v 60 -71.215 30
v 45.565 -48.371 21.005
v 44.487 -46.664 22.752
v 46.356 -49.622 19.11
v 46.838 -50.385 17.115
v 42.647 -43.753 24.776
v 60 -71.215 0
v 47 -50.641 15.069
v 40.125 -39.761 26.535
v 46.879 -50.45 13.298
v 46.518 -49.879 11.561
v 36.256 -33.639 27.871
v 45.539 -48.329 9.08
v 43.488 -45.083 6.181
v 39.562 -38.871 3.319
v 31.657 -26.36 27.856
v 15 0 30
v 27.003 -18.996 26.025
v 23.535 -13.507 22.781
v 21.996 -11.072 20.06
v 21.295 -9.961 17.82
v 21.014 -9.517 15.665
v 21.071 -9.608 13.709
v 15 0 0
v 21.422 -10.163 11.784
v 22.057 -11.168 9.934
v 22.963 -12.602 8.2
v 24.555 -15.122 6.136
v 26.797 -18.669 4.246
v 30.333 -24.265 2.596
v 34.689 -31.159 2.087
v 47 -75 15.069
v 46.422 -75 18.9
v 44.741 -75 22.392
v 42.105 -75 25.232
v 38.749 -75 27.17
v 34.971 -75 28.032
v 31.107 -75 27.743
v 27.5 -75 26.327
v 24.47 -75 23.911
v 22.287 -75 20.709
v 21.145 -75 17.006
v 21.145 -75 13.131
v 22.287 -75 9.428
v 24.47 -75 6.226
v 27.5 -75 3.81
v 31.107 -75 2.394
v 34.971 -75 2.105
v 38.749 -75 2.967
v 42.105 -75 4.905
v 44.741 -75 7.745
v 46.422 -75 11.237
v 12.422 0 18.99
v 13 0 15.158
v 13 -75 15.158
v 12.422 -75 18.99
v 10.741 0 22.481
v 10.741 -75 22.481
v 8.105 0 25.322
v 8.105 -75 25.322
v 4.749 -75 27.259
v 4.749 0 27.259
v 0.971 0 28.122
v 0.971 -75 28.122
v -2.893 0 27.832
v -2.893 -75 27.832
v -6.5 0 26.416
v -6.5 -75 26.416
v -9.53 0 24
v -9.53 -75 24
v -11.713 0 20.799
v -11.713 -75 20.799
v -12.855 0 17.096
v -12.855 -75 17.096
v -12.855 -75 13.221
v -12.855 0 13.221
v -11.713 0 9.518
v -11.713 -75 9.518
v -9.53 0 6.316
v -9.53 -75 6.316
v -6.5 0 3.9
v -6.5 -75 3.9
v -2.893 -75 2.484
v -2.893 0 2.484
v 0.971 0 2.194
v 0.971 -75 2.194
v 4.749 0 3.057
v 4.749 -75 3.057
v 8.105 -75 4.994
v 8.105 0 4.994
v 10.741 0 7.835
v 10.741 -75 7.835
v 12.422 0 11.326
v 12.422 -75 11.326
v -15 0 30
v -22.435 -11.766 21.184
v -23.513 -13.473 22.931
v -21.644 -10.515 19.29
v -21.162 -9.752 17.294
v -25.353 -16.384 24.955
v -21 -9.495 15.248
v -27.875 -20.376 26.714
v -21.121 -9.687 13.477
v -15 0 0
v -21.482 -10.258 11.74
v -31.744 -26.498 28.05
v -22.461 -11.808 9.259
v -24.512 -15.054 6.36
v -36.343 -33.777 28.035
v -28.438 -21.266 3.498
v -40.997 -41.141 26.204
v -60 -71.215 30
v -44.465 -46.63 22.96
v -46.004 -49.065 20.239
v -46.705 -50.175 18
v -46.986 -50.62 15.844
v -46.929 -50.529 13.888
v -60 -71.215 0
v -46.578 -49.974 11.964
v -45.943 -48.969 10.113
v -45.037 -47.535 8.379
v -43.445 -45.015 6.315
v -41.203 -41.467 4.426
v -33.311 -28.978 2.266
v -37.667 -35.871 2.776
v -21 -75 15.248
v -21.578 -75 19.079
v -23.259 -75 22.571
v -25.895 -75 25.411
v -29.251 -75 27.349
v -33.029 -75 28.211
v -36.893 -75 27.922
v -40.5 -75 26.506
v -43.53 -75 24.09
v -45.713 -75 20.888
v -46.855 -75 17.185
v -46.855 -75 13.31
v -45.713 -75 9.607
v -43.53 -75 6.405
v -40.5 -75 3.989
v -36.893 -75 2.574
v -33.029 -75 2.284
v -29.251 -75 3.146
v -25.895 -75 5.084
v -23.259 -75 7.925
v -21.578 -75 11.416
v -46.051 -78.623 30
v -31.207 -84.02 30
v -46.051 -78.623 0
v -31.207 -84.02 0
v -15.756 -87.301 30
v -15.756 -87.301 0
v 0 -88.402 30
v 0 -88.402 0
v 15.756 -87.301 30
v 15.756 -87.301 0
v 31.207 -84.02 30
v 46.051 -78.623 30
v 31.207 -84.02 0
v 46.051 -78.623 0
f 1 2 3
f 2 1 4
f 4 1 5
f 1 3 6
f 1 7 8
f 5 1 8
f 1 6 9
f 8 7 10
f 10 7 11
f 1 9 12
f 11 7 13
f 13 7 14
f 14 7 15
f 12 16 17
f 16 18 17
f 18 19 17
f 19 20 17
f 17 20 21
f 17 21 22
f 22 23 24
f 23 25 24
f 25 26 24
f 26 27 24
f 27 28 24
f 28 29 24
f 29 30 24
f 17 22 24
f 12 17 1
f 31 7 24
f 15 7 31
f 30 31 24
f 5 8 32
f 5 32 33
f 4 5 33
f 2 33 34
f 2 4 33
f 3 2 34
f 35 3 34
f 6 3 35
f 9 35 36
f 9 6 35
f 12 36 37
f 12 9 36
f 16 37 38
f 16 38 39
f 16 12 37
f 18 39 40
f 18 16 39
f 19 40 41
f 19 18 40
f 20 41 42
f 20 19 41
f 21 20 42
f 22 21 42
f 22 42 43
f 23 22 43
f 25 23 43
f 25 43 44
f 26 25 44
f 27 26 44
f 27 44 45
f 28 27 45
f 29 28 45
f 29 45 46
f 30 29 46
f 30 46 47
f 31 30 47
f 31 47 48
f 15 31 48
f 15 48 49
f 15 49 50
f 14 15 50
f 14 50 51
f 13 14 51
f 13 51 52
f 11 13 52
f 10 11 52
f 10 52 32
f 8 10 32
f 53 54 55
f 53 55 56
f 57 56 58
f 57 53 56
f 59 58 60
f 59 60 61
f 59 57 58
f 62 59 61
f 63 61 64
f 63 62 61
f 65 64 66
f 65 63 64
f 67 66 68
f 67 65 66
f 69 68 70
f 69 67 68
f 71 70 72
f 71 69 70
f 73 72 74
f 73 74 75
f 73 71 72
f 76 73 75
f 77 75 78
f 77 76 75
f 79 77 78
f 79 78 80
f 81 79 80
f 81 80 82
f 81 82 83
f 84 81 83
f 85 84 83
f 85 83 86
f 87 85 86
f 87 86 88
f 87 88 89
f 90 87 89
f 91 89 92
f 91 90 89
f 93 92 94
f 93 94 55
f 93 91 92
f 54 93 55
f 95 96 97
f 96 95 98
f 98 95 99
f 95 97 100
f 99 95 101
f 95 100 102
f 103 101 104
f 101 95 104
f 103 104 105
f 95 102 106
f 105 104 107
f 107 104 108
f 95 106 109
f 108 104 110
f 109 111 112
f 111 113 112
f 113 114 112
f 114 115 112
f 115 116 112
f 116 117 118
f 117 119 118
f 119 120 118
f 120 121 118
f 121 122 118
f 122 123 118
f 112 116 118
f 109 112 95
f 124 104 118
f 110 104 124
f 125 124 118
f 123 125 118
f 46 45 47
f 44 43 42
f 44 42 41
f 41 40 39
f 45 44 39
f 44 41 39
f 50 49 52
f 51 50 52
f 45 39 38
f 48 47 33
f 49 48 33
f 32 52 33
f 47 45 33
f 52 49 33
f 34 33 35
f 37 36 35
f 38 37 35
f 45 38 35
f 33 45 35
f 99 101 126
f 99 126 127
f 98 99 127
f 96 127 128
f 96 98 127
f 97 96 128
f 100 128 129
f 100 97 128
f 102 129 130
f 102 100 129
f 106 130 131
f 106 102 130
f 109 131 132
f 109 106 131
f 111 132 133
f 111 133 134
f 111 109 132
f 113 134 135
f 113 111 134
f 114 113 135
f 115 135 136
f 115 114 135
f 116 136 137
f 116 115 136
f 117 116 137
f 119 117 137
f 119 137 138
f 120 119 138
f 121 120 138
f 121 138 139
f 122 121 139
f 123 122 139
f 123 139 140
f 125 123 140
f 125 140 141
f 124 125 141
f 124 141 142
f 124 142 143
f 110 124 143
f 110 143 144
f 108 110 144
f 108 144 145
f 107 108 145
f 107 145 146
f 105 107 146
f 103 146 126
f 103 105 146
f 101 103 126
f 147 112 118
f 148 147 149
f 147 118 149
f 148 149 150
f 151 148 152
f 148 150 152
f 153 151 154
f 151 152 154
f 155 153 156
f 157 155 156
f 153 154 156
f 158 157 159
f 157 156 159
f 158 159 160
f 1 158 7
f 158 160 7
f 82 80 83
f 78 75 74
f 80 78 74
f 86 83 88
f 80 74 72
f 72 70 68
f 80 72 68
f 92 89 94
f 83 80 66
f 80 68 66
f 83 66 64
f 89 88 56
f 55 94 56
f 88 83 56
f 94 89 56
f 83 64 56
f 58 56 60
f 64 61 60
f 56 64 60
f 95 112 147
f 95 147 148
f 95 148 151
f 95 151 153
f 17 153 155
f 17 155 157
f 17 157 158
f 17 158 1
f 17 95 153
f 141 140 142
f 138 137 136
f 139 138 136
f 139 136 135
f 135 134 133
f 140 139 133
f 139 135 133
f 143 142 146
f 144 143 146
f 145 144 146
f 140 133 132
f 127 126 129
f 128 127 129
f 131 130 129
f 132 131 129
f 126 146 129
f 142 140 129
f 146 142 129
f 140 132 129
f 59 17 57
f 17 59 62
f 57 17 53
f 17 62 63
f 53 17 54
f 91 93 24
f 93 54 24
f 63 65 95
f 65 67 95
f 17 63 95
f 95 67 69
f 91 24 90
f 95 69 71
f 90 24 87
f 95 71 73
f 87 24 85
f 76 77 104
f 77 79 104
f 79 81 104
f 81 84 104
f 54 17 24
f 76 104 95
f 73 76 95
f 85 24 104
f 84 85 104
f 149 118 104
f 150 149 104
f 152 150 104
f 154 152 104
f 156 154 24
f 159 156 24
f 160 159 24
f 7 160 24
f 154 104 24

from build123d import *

# Parameters (mm, degrees)
F1_DEPTH = 30
F3_R     = 13
F3_R_2   = 11
F4_DEPTH = 75


# Not quite as in the source:
# - the program builds the solid bodies; features that only make, move or delete a surface that nothing else refers to are left out


with BuildPart() as f1:
    # F0 (on Top) → F1 (new body)
    with BuildSketch(Plane.XY):
        with BuildLine():
            Line((0, 0), (-15, 0))
            Line((-15, 0), (-60, -71.2145941459))
            ThreePointArc((-60, -71.2145941459), (0, -88.4018294902), (60, -71.2145941459))
            Line((60, -71.2145941459), (15, 0))
            Line((15, 0), (0, 0))
        make_face()
    extrude(amount=F1_DEPTH)

    # F3 (on Front) → F4 (cut)
    with BuildSketch(Plane.XZ):
        with Locations((-34, 15.2476818305)):
            Circle(F3_R)
        with Locations((-34, 15.2476818305)):
            Circle(F3_R_2, mode=Mode.SUBTRACT)
        with Locations((0, 15.1581136116)):
            Circle(F3_R)
        with Locations((0, 15.1581136116)):
            Circle(F3_R_2, mode=Mode.SUBTRACT)
        with Locations((34, 15.0685453927)):
            Circle(F3_R)
        with Locations((34, 15.0685453927)):
            Circle(F3_R_2, mode=Mode.SUBTRACT)
        with Locations((0, 15.1581136116)):
            Circle(F3_R_2)
        with Locations((34, 15.0685453927)):
            Circle(F3_R_2)
        with Locations((-34, 15.2476818305)):
            Circle(F3_R_2)
    extrude(amount=F4_DEPTH, mode=Mode.SUBTRACT)


solid = f1.part
